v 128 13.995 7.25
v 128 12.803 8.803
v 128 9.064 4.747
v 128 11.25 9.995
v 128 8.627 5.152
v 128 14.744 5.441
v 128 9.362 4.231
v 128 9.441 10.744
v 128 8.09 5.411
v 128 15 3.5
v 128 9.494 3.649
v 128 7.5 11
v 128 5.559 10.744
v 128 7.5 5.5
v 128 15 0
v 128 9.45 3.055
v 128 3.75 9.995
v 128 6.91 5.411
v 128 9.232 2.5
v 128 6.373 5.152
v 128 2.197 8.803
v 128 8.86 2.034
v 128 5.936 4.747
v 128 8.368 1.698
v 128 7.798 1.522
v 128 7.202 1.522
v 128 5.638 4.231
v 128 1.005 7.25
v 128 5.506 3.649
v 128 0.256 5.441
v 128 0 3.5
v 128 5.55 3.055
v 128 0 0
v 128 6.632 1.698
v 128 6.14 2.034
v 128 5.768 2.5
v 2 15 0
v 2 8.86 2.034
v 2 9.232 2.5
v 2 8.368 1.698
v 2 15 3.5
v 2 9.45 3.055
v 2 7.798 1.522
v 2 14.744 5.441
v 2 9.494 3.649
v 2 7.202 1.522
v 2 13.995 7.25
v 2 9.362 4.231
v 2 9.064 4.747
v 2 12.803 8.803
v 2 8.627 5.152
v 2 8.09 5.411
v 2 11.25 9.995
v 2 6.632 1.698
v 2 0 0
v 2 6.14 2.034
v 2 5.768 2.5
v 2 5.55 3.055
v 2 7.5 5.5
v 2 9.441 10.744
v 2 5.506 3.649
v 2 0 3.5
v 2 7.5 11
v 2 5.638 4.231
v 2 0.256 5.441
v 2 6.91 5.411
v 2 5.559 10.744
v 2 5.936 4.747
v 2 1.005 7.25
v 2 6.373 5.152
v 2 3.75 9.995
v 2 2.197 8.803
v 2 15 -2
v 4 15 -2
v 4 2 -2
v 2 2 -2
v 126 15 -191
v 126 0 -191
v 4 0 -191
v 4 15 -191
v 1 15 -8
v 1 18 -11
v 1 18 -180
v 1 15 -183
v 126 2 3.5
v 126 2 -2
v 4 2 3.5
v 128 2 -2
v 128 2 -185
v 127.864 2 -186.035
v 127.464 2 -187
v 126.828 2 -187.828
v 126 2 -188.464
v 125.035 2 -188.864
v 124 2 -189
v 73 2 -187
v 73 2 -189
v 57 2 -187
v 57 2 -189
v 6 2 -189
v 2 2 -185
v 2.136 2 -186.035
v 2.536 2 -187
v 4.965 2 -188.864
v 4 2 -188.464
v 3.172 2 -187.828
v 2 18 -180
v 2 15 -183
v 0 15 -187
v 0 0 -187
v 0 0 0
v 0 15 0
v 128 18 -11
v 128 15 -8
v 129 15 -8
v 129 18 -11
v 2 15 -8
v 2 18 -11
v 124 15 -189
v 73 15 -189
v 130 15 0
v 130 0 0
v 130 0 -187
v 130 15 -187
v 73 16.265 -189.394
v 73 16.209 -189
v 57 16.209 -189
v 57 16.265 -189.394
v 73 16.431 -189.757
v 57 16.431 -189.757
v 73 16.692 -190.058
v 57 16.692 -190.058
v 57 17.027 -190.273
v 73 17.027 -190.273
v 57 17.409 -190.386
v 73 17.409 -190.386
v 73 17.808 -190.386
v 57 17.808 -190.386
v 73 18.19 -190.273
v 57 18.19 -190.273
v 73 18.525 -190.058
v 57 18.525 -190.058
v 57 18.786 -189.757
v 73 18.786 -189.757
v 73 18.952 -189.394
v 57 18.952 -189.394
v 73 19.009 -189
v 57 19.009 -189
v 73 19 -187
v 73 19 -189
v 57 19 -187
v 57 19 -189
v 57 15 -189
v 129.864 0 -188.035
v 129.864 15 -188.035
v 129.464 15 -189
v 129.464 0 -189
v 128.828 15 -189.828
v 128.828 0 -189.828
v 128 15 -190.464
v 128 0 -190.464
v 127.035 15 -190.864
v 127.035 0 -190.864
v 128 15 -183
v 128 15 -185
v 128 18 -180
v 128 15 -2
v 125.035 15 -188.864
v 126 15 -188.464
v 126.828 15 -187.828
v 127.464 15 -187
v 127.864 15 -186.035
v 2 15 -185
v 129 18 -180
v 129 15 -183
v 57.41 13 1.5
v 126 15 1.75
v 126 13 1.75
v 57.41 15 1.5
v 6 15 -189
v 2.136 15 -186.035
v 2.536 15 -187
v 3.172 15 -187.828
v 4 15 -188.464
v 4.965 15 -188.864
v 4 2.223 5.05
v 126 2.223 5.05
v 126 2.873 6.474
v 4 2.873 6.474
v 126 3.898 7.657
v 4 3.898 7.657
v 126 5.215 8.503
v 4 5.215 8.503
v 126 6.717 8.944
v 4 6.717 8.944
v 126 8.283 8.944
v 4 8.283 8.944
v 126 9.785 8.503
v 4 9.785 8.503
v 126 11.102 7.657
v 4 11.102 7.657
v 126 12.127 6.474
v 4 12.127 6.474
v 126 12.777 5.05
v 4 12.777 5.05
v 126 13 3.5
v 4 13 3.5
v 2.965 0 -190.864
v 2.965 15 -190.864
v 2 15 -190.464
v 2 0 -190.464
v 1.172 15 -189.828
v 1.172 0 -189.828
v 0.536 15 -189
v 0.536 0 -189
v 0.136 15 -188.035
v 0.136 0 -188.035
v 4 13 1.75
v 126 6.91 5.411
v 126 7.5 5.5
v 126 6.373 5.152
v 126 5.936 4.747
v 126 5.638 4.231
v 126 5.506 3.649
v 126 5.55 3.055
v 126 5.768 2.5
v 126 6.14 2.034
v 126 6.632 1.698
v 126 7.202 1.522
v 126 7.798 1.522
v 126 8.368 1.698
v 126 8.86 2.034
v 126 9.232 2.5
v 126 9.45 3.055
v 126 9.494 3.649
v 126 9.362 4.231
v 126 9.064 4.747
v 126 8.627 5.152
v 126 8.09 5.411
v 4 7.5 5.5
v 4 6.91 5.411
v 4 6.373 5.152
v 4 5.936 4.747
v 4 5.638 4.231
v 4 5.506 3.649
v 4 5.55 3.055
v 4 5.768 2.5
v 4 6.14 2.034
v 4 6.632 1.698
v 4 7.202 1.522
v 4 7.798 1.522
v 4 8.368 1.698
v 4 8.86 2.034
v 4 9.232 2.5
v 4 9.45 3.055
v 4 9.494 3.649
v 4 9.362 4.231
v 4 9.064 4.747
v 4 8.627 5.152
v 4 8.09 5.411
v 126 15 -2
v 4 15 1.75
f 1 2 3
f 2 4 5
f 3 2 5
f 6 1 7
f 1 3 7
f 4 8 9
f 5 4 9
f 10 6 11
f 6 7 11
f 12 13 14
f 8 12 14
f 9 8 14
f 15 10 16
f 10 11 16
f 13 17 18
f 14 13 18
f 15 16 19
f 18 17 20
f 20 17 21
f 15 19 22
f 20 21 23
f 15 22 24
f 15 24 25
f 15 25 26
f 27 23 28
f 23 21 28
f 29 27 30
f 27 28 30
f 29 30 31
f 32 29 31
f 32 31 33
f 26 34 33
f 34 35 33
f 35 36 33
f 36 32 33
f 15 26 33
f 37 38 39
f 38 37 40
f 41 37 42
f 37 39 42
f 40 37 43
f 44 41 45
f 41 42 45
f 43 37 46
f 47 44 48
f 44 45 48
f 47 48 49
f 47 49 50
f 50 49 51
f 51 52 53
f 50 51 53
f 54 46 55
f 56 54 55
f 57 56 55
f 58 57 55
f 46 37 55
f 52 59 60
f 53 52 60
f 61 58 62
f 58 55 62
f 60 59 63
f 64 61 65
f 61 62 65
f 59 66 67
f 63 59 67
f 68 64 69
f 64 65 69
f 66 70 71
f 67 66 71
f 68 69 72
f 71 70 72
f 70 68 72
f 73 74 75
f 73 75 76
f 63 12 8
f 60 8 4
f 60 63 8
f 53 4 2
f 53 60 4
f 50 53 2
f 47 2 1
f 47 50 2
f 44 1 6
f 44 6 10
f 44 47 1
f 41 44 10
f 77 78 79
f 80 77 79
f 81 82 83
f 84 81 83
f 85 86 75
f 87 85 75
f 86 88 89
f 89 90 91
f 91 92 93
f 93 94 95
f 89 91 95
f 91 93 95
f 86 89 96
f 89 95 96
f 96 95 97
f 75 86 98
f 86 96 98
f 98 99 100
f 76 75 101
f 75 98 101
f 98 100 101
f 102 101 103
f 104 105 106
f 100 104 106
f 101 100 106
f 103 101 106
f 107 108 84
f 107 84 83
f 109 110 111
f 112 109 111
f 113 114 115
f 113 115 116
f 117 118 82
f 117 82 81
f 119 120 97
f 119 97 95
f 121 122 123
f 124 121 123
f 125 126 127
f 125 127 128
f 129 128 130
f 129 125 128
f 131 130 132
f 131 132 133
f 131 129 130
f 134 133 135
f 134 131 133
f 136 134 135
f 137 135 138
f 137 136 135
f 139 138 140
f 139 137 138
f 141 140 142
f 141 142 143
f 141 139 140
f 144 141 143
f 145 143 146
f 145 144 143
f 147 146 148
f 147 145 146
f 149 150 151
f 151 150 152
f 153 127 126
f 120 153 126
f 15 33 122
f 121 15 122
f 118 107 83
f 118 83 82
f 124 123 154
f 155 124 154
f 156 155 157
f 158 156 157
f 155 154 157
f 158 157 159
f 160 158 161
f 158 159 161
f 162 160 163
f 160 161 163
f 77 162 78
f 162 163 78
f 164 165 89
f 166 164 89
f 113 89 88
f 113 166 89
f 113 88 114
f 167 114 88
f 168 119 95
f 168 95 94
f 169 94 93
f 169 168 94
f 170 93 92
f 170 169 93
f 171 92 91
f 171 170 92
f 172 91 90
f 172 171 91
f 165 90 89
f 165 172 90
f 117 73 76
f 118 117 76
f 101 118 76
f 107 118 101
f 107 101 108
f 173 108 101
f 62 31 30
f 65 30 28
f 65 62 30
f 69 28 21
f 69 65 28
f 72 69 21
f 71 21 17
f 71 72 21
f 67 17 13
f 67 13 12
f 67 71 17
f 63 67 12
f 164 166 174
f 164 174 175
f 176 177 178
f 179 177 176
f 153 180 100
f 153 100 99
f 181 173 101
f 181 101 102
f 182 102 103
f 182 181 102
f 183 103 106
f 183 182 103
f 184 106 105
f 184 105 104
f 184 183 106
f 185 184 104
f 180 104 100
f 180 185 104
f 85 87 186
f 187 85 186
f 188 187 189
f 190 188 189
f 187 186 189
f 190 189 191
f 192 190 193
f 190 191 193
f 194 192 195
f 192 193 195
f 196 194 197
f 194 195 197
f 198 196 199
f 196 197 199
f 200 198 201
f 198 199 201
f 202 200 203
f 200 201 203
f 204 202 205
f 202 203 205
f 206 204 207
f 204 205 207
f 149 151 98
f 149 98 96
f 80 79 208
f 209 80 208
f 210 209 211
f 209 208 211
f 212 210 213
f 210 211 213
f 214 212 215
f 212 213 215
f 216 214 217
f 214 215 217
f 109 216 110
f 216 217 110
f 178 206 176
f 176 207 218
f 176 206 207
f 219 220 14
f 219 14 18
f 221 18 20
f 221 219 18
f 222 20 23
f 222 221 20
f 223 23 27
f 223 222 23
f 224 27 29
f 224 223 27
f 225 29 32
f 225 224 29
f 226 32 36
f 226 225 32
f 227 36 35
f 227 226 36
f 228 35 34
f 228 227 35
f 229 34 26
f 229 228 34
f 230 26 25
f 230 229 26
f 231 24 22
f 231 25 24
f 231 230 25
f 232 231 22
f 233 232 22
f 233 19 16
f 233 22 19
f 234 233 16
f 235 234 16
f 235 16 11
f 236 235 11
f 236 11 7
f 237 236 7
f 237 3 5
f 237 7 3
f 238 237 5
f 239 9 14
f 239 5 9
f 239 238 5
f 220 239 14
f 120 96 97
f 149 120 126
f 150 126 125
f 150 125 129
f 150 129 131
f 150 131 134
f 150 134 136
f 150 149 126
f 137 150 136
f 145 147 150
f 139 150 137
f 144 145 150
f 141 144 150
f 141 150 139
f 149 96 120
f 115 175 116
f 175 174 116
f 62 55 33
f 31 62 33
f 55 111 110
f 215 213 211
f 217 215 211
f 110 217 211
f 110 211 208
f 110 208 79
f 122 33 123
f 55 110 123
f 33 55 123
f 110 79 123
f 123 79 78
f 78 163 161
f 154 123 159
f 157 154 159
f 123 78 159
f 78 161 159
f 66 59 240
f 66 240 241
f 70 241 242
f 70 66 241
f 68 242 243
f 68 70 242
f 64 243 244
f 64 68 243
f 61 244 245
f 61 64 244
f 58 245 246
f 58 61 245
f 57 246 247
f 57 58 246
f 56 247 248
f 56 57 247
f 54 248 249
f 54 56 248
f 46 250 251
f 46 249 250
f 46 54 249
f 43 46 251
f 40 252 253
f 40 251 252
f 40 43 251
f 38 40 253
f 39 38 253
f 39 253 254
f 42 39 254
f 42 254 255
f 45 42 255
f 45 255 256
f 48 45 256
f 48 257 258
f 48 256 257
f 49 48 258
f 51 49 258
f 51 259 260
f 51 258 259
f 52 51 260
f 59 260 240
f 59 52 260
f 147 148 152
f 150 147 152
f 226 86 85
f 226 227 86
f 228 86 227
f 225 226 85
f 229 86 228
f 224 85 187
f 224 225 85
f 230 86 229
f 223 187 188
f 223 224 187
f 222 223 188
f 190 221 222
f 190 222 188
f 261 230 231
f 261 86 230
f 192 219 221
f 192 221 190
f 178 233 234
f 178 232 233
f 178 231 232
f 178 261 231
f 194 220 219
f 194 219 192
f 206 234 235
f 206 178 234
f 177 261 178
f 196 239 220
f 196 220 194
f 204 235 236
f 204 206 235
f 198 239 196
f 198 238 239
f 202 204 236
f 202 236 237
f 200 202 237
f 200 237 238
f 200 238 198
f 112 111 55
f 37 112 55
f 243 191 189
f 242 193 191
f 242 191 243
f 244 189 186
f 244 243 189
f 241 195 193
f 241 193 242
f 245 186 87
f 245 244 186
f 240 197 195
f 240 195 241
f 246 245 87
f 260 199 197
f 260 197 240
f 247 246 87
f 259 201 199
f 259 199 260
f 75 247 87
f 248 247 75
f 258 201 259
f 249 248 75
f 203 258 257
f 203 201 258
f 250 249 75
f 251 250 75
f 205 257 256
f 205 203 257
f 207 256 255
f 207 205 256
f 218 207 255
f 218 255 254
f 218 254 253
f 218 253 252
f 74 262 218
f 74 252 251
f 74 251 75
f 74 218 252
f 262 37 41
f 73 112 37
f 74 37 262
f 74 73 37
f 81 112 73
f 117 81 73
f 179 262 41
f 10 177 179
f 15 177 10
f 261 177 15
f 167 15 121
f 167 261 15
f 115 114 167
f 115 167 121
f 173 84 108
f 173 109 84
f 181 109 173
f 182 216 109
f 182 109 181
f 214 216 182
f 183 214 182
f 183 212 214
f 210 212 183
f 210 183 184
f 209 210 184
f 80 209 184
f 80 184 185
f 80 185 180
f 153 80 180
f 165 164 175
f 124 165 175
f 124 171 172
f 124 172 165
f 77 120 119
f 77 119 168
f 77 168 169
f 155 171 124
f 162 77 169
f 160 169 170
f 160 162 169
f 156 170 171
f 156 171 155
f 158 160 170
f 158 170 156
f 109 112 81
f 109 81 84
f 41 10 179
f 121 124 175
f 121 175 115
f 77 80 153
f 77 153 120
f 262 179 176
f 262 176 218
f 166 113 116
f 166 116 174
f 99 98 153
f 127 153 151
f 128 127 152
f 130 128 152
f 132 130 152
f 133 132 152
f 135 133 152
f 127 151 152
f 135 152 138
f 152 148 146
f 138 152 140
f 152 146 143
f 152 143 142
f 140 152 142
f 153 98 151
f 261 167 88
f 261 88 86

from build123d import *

# Parameters (mm, degrees)
SALIENTE_EXTRUIR2_DEPTH    = 15
CORTAR_EXTRUIR5_START      = -126
CORTAR_EXTRUIR5_DEPTH      = 126
CORTAR_EXTRUIR6_DEPTH      = 13
SALIENTE_EXTRUIR3_DEPTH    = 1
SALIENTE_EXTRUIR4_DEPTH    = 1
CORTAR_EXTRUIR7_DEPTH      = 122
SALIENTE_EXTRUIR5_DEPTH    = 2
SALIENTE_EXTRUIR6_DEPTH    = 16
CORTAR_EXTRUIR8_DEPTH      = 180
CORTAR_EXTRUIR8_DEPTH_BACK = 180
CROQUIS12_R                = 2


# Read off the part's stored shape, not the designer's step: Cortar-Extruir5
with BuildPart() as part:
    # Croquis1 → Saliente-Extruir2 (new body)
    with BuildSketch(Plane(origin=(0, 0, 0), x_dir=(1, 0, 0), z_dir=(0, 1, 0))):
        with BuildLine():
            Line((0, 0), (2, 0))
            Line((2, 0), (2, -11))
            Line((2, -11), (128, -11))
            Line((128, -11), (128, 0))
            Line((128, 0), (130, 0))
            Line((130, 0), (130, 187))
            ThreePointArc((130, 187), (128.828427125, 189.828427125), (126, 191))
            Line((126, 191), (4, 191))
            ThreePointArc((4, 191), (1.171572875, 189.828427125), (0, 187))
            Line((0, 187), (0, 0))
        make_face()
    extrude(amount=SALIENTE_EXTRUIR2_DEPTH)

    # Cortar-Extruir5 outline → Cortar-Extruir5 (cut)
    with BuildSketch(Plane(origin=(128, 0, 0), x_dir=(0, 0, -1), z_dir=(1, 0, 0)).offset(CORTAR_EXTRUIR5_START)):
        with BuildLine():
            Line((-11, 0), (-3.5, 0))
            ThreePointArc((-3.5, 0), (-8.803300859, 2.196699141), (-11, 7.5))
            Line((-11, 7.5), (-11, 0))
        make_face()
        with BuildLine():
            Line((-11, 15), (-11, 7.5))
            ThreePointArc((-11, 7.5), (-8.803300859, 12.803300859), (-3.5, 15))
            Line((-3.5, 15), (-11, 15))
        make_face()
    extrude(amount=CORTAR_EXTRUIR5_DEPTH, mode=Mode.SUBTRACT)

    # Croquis3 → Cortar-Extruir6 (cut)
    with BuildSketch(Plane(origin=(0, 15, 0), x_dir=(1, 0, 0), z_dir=(0, 1, 0))):
        with BuildLine():
            Line((2, 80.037921952), (2, 185))
            ThreePointArc((2, 185), (3.171572875, 187.828427125), (6, 189))
            Line((6, 189), (124, 189))
            ThreePointArc((124, 189), (126.828427125, 187.828427125), (128, 185))
            Line((128, 185), (128, 95.850744251))
            Line((128, 95.850744251), (128, 2))
            Line((128, 2), (126, 2))
            Line((126, 2), (126, -1.75))
            Line((126, -1.75), (57.409845297, -1.5))
            Line((57.409845297, -1.5), (4, -1.75))
            Line((4, -1.75), (4, 2))
            Line((4, 2), (2, 2))
            Line((2, 2), (2, 80.037921952))
        make_face()
    extrude(amount=-CORTAR_EXTRUIR6_DEPTH, mode=Mode.SUBTRACT)

    # Croquis6 → Saliente-Extruir3 (add)
    with BuildSketch(Plane.ZY.offset(-128)):
        Polygon((-183, 15), (-8, 15), (-11, 18), (-180, 18), align=None)
    extrude(amount=-SALIENTE_EXTRUIR3_DEPTH)

    # Croquis7 → Saliente-Extruir4 (add)
    with BuildSketch(Plane(origin=(2, 0, 0), x_dir=(0, 0, -1), z_dir=(1, 0, 0))):
        Polygon((183, 15), (180, 18), (11, 18), (8, 15), align=None)
    extrude(amount=-SALIENTE_EXTRUIR4_DEPTH)

    # Croquis8 → Cortar-Extruir7 (cut)
    with BuildSketch(Plane(origin=(4, 0, 0), x_dir=(0, 0, -1), z_dir=(1, 0, 0))):
        with BuildLine():
            Line((-3.5, 13), (5.32233659, 13))
            Line((5.32233659, 13), (5.32233659, 2))
            Line((5.32233659, 2), (-3.5, 2))
            ThreePointArc((-3.5, 2), (-9, 7.5), (-3.5, 13))
        make_face()
    extrude(amount=CORTAR_EXTRUIR7_DEPTH, mode=Mode.SUBTRACT)

    # Croquis10 → Saliente-Extruir5 (add)
    with BuildSketch(Plane.XY.offset(-189)):
        Polygon((65, 2), (73, 2), (73, 19), (72.859656946, 19), (57, 19), (57, 2), align=None)
    extrude(amount=SALIENTE_EXTRUIR5_DEPTH)

    # Croquis11 → Saliente-Extruir6 (add)
    with BuildSketch(Plane(origin=(73, 0, 0), x_dir=(0, 0, -1), z_dir=(1, 0, 0))):
        with BuildLine():
            Line((189, 19.00862759), (189, 16.20862759))
            ThreePointArc((189, 16.20862759), (190.4, 17.60862759), (189, 19.00862759))
        make_face()
    extrude(amount=-SALIENTE_EXTRUIR6_DEPTH)

    # Croquis12 → Cortar-Extruir8 (cut, two sides: drawn at the far end of the back side and taken through both)
    with BuildSketch(Plane(origin=(4, 0, 0), x_dir=(0, 0, -1), z_dir=(1, 0, 0)).offset(-CORTAR_EXTRUIR8_DEPTH_BACK)):
        with Locations(Location((-3.5, 7.5, 0), (0, 0, 180))):
            Circle(CROQUIS12_R)
    extrude(amount=CORTAR_EXTRUIR8_DEPTH + CORTAR_EXTRUIR8_DEPTH_BACK, mode=Mode.SUBTRACT)


solid = part.part
